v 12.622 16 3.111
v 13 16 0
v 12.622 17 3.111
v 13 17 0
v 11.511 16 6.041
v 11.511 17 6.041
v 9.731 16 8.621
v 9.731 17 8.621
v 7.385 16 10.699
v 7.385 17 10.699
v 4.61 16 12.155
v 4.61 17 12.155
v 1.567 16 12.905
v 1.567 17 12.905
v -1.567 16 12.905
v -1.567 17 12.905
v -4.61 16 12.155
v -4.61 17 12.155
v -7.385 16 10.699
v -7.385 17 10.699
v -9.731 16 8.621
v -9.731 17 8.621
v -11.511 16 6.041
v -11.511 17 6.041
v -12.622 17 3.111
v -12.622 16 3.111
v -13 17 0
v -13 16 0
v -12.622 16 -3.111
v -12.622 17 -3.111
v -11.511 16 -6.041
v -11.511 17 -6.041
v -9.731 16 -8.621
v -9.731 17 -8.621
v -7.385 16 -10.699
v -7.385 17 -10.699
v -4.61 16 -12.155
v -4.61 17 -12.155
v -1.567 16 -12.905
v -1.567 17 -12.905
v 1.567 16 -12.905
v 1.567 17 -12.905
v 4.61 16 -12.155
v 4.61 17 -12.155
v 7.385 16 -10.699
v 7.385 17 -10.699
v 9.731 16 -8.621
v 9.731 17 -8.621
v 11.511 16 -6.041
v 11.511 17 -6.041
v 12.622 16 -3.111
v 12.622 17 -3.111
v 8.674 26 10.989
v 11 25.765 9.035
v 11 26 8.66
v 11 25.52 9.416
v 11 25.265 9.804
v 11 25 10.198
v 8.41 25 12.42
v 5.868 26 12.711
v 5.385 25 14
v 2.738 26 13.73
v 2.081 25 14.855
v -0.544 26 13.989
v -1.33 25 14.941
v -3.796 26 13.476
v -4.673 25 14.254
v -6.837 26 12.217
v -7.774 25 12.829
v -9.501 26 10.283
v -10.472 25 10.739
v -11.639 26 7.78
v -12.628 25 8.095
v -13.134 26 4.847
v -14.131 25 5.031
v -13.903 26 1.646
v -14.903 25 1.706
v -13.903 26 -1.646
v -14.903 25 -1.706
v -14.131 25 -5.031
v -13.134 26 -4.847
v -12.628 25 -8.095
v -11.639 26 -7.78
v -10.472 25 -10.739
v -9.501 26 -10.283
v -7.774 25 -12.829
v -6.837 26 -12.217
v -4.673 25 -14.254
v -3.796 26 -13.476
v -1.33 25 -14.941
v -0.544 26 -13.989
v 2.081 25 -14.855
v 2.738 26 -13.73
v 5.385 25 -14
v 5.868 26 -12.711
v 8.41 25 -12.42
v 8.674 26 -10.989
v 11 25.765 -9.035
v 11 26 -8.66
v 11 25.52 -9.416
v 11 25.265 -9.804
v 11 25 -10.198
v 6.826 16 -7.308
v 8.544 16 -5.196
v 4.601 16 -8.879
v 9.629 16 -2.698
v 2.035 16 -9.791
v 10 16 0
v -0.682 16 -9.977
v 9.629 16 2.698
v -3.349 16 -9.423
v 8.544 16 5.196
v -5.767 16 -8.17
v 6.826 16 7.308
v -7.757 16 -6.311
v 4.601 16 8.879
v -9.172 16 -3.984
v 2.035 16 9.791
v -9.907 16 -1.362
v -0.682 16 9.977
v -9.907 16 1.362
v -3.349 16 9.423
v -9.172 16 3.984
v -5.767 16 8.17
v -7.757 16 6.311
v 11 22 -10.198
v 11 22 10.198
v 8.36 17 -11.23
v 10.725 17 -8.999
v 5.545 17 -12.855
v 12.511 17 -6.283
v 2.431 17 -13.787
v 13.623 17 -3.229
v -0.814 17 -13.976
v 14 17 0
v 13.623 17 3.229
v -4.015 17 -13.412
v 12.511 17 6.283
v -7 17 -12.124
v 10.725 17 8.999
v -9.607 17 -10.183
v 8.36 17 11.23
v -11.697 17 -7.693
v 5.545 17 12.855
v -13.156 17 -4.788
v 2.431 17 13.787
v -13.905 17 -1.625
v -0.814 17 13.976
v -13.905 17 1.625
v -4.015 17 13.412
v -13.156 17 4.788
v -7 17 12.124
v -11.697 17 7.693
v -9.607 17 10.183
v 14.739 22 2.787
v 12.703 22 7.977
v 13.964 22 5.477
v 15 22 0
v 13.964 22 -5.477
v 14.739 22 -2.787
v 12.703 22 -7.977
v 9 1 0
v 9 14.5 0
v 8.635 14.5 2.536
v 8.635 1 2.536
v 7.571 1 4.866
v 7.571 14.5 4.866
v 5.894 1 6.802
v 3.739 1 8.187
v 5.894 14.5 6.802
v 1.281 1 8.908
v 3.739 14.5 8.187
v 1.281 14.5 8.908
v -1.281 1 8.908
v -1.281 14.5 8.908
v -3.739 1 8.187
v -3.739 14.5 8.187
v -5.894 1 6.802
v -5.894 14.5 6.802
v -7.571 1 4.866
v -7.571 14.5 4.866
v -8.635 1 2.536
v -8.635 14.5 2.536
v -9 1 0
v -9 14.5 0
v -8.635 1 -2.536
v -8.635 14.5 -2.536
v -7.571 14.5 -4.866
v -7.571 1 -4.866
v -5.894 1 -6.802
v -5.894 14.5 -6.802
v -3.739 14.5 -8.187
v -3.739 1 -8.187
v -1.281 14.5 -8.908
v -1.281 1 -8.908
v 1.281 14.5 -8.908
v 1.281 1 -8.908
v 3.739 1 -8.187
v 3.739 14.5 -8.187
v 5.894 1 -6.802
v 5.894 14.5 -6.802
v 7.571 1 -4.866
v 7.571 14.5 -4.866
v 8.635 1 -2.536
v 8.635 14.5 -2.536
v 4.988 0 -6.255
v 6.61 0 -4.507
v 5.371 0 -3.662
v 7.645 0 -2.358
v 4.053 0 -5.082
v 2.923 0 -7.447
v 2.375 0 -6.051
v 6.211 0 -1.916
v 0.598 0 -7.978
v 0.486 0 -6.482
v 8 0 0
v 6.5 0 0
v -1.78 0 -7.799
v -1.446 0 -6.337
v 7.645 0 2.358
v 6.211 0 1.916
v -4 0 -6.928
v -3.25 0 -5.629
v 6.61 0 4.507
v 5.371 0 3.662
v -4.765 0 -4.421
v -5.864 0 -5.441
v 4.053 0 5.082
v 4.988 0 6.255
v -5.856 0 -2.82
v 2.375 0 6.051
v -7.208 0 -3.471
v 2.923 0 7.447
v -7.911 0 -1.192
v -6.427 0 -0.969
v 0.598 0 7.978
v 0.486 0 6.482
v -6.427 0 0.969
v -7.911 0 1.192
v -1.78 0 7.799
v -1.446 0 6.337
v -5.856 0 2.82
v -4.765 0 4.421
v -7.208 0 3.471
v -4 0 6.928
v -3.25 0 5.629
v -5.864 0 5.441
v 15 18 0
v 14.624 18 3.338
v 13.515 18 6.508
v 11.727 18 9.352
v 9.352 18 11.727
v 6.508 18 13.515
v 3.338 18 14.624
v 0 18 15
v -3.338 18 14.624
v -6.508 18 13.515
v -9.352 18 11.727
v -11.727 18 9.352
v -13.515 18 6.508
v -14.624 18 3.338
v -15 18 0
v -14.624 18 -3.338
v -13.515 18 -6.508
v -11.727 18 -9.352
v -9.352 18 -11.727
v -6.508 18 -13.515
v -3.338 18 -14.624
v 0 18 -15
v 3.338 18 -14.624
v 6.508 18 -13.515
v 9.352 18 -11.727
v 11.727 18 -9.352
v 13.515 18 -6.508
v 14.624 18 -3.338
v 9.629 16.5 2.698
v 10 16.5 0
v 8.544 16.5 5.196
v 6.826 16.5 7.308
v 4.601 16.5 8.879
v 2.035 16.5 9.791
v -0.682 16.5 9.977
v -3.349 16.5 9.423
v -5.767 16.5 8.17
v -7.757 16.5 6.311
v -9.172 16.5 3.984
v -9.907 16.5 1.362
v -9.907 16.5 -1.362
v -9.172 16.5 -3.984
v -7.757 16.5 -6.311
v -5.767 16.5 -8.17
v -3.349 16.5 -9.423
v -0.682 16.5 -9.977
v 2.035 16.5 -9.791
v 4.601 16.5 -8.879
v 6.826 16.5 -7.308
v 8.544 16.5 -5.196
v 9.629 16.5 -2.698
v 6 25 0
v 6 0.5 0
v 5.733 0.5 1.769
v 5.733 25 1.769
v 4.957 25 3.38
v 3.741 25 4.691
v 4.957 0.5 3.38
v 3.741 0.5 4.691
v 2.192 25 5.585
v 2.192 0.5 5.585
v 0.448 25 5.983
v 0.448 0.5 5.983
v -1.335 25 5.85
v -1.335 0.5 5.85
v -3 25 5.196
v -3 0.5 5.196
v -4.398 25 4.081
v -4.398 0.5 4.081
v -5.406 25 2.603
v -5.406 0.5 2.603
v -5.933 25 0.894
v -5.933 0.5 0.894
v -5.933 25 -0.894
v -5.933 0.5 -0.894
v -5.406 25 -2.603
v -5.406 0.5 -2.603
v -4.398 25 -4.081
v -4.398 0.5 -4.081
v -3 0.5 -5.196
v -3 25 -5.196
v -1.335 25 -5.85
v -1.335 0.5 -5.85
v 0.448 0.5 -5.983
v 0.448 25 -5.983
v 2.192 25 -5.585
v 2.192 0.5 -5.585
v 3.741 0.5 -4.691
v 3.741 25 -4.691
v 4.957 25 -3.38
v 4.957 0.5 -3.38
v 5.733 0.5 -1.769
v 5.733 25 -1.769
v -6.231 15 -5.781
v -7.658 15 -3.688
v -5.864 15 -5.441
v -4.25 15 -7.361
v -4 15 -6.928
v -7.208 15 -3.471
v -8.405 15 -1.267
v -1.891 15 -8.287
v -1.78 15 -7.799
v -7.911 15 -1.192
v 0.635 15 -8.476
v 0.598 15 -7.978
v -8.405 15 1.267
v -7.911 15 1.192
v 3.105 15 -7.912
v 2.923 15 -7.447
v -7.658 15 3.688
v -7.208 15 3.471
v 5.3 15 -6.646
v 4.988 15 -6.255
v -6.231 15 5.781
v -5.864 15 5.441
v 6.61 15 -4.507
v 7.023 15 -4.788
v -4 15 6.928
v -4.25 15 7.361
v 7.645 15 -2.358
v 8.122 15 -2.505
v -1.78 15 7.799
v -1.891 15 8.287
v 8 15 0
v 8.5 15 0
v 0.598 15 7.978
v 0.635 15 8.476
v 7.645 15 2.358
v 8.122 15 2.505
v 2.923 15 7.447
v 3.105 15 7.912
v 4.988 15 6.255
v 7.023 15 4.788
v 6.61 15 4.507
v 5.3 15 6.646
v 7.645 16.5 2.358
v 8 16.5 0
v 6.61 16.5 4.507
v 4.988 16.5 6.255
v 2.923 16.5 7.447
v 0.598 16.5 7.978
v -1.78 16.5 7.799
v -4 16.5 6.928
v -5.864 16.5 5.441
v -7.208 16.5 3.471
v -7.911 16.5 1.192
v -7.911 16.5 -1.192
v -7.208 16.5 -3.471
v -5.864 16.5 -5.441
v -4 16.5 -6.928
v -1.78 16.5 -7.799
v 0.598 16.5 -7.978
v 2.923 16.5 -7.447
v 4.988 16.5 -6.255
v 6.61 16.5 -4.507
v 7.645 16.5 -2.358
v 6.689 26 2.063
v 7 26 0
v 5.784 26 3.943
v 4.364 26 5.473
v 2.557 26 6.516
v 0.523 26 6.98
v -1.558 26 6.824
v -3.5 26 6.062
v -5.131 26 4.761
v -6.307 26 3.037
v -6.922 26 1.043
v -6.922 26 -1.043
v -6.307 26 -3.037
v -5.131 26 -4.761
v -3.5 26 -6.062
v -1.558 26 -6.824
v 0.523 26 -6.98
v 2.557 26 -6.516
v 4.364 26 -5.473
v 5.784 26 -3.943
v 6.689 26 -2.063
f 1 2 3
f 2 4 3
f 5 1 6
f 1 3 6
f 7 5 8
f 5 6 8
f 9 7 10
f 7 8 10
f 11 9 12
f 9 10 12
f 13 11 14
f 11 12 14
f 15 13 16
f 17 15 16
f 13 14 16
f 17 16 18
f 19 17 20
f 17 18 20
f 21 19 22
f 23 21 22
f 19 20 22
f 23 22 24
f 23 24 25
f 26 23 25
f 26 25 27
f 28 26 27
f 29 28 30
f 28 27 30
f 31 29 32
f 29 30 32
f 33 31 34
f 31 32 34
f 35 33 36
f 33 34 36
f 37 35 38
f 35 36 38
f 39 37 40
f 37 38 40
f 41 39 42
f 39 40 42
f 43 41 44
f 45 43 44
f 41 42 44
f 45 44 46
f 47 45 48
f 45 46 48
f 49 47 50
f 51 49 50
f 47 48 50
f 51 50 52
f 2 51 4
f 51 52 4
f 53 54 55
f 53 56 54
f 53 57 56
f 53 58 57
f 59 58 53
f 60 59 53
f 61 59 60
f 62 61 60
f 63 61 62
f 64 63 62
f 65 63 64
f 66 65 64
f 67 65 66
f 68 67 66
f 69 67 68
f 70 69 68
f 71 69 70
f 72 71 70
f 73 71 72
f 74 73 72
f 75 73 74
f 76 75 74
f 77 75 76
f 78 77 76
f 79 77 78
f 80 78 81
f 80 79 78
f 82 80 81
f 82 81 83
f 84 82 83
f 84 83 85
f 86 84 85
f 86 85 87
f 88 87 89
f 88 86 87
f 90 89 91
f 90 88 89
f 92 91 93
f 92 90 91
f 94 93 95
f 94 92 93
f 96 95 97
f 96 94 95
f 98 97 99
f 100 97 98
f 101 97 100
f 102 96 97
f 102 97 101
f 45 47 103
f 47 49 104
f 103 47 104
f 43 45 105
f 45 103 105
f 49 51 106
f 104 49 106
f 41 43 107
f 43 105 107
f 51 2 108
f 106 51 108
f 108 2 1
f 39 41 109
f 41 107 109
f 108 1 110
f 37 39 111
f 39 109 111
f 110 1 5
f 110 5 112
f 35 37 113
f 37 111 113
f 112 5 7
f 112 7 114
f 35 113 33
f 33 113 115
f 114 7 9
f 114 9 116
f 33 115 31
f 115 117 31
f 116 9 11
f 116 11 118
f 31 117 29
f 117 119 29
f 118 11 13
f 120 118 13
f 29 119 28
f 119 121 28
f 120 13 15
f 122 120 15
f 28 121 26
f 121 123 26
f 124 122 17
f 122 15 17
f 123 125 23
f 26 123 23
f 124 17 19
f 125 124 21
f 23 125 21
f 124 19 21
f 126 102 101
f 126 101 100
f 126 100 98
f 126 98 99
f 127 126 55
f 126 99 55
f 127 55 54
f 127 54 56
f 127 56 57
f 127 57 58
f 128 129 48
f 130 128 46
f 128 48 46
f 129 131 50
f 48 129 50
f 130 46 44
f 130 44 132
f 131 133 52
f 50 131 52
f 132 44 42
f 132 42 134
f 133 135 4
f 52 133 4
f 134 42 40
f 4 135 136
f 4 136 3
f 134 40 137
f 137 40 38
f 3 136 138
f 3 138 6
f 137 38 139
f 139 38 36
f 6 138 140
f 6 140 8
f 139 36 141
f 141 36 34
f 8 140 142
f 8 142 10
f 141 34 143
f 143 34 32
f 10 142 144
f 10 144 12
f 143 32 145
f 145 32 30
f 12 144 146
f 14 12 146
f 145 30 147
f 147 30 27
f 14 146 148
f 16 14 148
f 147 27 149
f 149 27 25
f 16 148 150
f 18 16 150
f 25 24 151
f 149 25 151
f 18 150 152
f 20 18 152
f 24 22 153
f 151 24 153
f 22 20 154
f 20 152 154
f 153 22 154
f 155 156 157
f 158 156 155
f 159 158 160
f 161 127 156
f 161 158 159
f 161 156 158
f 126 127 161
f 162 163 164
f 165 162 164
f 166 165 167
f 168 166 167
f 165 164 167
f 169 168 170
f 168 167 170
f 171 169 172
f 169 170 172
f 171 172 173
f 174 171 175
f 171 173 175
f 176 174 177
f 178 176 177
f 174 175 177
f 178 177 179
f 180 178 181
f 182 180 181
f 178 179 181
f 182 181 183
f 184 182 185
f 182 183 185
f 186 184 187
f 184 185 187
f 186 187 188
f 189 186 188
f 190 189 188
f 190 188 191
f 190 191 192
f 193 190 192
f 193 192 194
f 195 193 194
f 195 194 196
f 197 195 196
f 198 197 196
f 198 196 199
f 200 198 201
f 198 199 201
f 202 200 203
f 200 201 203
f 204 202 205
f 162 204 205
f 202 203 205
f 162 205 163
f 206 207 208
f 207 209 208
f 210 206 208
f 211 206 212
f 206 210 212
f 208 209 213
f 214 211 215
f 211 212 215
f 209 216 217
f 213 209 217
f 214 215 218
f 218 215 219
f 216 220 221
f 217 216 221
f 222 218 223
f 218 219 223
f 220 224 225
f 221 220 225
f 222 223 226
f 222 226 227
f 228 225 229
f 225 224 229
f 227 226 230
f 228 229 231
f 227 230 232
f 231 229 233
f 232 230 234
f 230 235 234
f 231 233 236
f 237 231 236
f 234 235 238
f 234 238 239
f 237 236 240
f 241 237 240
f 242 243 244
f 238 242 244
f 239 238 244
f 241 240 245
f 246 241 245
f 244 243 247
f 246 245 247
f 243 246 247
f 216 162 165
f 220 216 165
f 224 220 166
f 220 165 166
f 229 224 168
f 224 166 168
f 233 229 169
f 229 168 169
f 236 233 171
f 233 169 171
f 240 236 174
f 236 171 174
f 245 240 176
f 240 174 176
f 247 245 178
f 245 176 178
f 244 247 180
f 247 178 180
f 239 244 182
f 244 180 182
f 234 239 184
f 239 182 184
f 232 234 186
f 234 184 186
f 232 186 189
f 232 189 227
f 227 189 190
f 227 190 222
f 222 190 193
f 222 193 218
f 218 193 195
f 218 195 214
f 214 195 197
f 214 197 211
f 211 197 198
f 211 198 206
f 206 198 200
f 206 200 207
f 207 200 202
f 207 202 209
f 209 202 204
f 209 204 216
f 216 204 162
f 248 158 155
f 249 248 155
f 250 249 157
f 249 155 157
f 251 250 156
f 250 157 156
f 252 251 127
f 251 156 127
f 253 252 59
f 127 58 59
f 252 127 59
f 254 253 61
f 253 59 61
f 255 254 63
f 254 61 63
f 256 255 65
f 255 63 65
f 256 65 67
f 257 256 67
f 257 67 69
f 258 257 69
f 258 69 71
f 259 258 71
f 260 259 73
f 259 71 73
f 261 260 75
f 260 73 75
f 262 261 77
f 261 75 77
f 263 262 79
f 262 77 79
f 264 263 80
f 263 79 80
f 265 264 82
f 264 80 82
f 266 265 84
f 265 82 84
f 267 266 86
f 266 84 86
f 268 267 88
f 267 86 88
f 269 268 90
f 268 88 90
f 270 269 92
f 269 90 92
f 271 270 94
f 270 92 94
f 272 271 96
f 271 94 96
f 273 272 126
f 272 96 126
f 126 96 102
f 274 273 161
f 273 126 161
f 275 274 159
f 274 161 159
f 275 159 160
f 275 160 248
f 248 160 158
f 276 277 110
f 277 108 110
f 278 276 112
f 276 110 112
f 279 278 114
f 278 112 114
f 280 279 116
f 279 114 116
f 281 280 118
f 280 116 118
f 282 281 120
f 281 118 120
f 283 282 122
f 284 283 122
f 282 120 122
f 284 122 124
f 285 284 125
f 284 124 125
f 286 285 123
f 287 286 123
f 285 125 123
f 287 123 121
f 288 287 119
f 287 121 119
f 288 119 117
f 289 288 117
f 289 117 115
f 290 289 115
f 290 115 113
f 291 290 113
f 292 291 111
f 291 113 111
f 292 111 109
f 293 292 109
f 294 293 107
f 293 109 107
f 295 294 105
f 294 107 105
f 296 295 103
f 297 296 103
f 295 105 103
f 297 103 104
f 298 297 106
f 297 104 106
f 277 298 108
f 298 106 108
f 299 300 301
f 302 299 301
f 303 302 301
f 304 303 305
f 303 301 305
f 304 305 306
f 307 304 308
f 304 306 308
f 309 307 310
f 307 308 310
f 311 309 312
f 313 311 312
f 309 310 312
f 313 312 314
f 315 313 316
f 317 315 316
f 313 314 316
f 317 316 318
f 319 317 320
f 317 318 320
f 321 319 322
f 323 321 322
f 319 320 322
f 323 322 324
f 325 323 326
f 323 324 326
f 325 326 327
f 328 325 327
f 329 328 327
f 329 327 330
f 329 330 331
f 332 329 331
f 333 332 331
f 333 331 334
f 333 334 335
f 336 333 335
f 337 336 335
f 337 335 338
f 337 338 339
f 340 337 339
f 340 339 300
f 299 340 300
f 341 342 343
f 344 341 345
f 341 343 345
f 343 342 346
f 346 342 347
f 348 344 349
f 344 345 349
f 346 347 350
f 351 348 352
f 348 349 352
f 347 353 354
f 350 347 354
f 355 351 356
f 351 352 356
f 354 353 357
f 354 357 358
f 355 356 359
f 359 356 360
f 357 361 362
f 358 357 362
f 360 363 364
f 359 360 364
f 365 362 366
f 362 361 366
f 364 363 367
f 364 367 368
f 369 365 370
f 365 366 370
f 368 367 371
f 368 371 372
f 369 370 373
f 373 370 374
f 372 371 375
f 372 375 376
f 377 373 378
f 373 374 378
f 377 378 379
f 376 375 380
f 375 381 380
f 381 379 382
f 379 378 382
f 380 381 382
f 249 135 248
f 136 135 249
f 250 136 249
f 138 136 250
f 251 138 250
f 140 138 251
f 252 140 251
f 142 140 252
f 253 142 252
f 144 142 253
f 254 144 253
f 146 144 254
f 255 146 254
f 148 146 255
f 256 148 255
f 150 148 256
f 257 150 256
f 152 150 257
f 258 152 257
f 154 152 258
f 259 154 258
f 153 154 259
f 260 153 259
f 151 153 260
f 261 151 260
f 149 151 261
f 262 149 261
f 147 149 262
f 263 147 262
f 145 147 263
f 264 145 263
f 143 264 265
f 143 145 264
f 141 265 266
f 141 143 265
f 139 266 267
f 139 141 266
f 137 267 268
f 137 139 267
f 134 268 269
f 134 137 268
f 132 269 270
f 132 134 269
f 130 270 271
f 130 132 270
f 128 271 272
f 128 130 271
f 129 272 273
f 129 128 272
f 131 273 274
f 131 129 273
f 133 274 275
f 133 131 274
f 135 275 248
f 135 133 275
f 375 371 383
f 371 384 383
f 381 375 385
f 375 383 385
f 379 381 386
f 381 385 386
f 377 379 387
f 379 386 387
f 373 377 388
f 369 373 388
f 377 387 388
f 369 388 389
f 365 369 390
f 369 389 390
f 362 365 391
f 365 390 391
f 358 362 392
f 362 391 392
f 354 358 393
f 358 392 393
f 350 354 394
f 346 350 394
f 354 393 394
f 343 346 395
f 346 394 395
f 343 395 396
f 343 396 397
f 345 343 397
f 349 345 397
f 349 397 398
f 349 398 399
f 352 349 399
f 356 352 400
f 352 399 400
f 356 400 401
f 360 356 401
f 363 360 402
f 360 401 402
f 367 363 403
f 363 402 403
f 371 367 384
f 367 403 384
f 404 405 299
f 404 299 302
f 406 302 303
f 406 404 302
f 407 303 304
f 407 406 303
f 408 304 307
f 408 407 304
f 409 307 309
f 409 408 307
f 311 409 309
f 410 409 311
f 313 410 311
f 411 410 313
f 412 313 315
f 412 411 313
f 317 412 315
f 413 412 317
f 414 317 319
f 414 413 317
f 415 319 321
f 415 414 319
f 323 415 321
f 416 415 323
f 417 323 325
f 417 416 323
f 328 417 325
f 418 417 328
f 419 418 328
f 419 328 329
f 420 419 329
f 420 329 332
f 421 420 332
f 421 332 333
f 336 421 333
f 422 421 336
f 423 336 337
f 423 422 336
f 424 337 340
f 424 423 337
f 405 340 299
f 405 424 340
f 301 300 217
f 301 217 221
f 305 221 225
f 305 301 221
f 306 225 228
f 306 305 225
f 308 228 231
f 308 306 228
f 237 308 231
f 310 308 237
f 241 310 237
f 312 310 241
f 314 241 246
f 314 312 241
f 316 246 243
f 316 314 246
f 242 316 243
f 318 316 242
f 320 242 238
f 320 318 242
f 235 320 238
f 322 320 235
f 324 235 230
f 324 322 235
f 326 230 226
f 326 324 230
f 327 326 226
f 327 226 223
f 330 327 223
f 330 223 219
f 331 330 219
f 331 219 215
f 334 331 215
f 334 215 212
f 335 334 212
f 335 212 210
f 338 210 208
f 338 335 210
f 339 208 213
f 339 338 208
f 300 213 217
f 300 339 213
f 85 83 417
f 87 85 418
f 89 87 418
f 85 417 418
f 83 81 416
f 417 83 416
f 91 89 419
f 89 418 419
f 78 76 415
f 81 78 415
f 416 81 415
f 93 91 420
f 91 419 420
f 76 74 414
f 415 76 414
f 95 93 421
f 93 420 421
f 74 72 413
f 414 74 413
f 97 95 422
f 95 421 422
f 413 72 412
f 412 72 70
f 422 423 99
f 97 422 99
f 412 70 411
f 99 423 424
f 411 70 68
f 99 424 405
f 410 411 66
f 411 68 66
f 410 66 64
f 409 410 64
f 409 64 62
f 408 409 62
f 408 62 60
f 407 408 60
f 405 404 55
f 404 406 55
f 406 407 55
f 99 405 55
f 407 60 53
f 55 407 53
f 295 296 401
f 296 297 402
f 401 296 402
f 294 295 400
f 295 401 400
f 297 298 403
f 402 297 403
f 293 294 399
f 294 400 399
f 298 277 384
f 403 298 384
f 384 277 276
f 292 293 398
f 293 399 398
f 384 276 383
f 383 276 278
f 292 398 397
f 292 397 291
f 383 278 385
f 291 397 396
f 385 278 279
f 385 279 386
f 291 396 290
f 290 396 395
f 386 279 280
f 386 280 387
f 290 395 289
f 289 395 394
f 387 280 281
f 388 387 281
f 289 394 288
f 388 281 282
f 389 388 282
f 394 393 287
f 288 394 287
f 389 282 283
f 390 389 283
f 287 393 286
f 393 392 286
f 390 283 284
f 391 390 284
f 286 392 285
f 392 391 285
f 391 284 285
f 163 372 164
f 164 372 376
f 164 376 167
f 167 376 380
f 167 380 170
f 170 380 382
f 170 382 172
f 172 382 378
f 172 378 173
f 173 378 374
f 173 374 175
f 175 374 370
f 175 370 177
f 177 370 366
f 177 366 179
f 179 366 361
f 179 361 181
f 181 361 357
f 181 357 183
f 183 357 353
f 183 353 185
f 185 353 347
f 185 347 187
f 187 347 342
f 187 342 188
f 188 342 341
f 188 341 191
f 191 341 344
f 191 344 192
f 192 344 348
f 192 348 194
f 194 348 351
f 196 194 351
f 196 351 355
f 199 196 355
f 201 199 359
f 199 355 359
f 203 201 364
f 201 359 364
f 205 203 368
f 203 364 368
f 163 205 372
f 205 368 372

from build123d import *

# Parameters (mm, degrees)
SKETCH_2_R          = 6
CUT_EXTRUDE_1_DEPTH = 27
CUT_EXTRUDE_2_DEPTH = 4
CHAMFER_3_SIZE      = 1
CHAMFER_4_SIZE      = 0.5


with BuildPart() as part:
    # 草图1 → 旋转1 (revolve)
    with BuildSketch(Plane.XY):
        Polygon((0, 0), (9, 0), (9, 15), (8, 15), (8, 16), (8, 16.5), (10, 16.5), (10, 16), (13, 16), (13, 17), (15, 17), (15, 26), (0, 26), align=None)
    revolve(axis=Axis((0, 26, 0), (0, -1, 0)))

    # 草图2 → 切除-拉伸1 (cut, through all)
    with BuildSketch(Plane.XZ):
        Circle(SKETCH_2_R)
    extrude(amount=-CUT_EXTRUDE_1_DEPTH, mode=Mode.SUBTRACT)

    # 草图3 → 切除-拉伸2 (cut)
    with BuildSketch(Plane(origin=(0, 26, 0), x_dir=(1, 0, 0), z_dir=(0, 1, 0))):
        with BuildLine():
            Line((11, 10.198039027), (11, -10.198039027))
            ThreePointArc((11, -10.198039027), (15, 0), (11, 10.198039027))
        make_face()
    extrude(amount=-CUT_EXTRUDE_2_DEPTH, mode=Mode.SUBTRACT)

    # 倒角3
    chamfer_3_edges = [part.edges().sort_by_distance(p)[0] for p in [
        (-9, 0, 0),
        (-15, 17, 0),
        (-6, 26, 0),
        (-15, 26, 0),
    ]]
    chamfer(chamfer_3_edges, length=CHAMFER_3_SIZE)

    # 倒角4
    chamfer_4_edges = [part.edges().sort_by_distance(p)[0] for p in [
        (-9, 15, 0),
        (-6, 0, 0),
    ]]
    chamfer(chamfer_4_edges, length=CHAMFER_4_SIZE)


solid = part.part
